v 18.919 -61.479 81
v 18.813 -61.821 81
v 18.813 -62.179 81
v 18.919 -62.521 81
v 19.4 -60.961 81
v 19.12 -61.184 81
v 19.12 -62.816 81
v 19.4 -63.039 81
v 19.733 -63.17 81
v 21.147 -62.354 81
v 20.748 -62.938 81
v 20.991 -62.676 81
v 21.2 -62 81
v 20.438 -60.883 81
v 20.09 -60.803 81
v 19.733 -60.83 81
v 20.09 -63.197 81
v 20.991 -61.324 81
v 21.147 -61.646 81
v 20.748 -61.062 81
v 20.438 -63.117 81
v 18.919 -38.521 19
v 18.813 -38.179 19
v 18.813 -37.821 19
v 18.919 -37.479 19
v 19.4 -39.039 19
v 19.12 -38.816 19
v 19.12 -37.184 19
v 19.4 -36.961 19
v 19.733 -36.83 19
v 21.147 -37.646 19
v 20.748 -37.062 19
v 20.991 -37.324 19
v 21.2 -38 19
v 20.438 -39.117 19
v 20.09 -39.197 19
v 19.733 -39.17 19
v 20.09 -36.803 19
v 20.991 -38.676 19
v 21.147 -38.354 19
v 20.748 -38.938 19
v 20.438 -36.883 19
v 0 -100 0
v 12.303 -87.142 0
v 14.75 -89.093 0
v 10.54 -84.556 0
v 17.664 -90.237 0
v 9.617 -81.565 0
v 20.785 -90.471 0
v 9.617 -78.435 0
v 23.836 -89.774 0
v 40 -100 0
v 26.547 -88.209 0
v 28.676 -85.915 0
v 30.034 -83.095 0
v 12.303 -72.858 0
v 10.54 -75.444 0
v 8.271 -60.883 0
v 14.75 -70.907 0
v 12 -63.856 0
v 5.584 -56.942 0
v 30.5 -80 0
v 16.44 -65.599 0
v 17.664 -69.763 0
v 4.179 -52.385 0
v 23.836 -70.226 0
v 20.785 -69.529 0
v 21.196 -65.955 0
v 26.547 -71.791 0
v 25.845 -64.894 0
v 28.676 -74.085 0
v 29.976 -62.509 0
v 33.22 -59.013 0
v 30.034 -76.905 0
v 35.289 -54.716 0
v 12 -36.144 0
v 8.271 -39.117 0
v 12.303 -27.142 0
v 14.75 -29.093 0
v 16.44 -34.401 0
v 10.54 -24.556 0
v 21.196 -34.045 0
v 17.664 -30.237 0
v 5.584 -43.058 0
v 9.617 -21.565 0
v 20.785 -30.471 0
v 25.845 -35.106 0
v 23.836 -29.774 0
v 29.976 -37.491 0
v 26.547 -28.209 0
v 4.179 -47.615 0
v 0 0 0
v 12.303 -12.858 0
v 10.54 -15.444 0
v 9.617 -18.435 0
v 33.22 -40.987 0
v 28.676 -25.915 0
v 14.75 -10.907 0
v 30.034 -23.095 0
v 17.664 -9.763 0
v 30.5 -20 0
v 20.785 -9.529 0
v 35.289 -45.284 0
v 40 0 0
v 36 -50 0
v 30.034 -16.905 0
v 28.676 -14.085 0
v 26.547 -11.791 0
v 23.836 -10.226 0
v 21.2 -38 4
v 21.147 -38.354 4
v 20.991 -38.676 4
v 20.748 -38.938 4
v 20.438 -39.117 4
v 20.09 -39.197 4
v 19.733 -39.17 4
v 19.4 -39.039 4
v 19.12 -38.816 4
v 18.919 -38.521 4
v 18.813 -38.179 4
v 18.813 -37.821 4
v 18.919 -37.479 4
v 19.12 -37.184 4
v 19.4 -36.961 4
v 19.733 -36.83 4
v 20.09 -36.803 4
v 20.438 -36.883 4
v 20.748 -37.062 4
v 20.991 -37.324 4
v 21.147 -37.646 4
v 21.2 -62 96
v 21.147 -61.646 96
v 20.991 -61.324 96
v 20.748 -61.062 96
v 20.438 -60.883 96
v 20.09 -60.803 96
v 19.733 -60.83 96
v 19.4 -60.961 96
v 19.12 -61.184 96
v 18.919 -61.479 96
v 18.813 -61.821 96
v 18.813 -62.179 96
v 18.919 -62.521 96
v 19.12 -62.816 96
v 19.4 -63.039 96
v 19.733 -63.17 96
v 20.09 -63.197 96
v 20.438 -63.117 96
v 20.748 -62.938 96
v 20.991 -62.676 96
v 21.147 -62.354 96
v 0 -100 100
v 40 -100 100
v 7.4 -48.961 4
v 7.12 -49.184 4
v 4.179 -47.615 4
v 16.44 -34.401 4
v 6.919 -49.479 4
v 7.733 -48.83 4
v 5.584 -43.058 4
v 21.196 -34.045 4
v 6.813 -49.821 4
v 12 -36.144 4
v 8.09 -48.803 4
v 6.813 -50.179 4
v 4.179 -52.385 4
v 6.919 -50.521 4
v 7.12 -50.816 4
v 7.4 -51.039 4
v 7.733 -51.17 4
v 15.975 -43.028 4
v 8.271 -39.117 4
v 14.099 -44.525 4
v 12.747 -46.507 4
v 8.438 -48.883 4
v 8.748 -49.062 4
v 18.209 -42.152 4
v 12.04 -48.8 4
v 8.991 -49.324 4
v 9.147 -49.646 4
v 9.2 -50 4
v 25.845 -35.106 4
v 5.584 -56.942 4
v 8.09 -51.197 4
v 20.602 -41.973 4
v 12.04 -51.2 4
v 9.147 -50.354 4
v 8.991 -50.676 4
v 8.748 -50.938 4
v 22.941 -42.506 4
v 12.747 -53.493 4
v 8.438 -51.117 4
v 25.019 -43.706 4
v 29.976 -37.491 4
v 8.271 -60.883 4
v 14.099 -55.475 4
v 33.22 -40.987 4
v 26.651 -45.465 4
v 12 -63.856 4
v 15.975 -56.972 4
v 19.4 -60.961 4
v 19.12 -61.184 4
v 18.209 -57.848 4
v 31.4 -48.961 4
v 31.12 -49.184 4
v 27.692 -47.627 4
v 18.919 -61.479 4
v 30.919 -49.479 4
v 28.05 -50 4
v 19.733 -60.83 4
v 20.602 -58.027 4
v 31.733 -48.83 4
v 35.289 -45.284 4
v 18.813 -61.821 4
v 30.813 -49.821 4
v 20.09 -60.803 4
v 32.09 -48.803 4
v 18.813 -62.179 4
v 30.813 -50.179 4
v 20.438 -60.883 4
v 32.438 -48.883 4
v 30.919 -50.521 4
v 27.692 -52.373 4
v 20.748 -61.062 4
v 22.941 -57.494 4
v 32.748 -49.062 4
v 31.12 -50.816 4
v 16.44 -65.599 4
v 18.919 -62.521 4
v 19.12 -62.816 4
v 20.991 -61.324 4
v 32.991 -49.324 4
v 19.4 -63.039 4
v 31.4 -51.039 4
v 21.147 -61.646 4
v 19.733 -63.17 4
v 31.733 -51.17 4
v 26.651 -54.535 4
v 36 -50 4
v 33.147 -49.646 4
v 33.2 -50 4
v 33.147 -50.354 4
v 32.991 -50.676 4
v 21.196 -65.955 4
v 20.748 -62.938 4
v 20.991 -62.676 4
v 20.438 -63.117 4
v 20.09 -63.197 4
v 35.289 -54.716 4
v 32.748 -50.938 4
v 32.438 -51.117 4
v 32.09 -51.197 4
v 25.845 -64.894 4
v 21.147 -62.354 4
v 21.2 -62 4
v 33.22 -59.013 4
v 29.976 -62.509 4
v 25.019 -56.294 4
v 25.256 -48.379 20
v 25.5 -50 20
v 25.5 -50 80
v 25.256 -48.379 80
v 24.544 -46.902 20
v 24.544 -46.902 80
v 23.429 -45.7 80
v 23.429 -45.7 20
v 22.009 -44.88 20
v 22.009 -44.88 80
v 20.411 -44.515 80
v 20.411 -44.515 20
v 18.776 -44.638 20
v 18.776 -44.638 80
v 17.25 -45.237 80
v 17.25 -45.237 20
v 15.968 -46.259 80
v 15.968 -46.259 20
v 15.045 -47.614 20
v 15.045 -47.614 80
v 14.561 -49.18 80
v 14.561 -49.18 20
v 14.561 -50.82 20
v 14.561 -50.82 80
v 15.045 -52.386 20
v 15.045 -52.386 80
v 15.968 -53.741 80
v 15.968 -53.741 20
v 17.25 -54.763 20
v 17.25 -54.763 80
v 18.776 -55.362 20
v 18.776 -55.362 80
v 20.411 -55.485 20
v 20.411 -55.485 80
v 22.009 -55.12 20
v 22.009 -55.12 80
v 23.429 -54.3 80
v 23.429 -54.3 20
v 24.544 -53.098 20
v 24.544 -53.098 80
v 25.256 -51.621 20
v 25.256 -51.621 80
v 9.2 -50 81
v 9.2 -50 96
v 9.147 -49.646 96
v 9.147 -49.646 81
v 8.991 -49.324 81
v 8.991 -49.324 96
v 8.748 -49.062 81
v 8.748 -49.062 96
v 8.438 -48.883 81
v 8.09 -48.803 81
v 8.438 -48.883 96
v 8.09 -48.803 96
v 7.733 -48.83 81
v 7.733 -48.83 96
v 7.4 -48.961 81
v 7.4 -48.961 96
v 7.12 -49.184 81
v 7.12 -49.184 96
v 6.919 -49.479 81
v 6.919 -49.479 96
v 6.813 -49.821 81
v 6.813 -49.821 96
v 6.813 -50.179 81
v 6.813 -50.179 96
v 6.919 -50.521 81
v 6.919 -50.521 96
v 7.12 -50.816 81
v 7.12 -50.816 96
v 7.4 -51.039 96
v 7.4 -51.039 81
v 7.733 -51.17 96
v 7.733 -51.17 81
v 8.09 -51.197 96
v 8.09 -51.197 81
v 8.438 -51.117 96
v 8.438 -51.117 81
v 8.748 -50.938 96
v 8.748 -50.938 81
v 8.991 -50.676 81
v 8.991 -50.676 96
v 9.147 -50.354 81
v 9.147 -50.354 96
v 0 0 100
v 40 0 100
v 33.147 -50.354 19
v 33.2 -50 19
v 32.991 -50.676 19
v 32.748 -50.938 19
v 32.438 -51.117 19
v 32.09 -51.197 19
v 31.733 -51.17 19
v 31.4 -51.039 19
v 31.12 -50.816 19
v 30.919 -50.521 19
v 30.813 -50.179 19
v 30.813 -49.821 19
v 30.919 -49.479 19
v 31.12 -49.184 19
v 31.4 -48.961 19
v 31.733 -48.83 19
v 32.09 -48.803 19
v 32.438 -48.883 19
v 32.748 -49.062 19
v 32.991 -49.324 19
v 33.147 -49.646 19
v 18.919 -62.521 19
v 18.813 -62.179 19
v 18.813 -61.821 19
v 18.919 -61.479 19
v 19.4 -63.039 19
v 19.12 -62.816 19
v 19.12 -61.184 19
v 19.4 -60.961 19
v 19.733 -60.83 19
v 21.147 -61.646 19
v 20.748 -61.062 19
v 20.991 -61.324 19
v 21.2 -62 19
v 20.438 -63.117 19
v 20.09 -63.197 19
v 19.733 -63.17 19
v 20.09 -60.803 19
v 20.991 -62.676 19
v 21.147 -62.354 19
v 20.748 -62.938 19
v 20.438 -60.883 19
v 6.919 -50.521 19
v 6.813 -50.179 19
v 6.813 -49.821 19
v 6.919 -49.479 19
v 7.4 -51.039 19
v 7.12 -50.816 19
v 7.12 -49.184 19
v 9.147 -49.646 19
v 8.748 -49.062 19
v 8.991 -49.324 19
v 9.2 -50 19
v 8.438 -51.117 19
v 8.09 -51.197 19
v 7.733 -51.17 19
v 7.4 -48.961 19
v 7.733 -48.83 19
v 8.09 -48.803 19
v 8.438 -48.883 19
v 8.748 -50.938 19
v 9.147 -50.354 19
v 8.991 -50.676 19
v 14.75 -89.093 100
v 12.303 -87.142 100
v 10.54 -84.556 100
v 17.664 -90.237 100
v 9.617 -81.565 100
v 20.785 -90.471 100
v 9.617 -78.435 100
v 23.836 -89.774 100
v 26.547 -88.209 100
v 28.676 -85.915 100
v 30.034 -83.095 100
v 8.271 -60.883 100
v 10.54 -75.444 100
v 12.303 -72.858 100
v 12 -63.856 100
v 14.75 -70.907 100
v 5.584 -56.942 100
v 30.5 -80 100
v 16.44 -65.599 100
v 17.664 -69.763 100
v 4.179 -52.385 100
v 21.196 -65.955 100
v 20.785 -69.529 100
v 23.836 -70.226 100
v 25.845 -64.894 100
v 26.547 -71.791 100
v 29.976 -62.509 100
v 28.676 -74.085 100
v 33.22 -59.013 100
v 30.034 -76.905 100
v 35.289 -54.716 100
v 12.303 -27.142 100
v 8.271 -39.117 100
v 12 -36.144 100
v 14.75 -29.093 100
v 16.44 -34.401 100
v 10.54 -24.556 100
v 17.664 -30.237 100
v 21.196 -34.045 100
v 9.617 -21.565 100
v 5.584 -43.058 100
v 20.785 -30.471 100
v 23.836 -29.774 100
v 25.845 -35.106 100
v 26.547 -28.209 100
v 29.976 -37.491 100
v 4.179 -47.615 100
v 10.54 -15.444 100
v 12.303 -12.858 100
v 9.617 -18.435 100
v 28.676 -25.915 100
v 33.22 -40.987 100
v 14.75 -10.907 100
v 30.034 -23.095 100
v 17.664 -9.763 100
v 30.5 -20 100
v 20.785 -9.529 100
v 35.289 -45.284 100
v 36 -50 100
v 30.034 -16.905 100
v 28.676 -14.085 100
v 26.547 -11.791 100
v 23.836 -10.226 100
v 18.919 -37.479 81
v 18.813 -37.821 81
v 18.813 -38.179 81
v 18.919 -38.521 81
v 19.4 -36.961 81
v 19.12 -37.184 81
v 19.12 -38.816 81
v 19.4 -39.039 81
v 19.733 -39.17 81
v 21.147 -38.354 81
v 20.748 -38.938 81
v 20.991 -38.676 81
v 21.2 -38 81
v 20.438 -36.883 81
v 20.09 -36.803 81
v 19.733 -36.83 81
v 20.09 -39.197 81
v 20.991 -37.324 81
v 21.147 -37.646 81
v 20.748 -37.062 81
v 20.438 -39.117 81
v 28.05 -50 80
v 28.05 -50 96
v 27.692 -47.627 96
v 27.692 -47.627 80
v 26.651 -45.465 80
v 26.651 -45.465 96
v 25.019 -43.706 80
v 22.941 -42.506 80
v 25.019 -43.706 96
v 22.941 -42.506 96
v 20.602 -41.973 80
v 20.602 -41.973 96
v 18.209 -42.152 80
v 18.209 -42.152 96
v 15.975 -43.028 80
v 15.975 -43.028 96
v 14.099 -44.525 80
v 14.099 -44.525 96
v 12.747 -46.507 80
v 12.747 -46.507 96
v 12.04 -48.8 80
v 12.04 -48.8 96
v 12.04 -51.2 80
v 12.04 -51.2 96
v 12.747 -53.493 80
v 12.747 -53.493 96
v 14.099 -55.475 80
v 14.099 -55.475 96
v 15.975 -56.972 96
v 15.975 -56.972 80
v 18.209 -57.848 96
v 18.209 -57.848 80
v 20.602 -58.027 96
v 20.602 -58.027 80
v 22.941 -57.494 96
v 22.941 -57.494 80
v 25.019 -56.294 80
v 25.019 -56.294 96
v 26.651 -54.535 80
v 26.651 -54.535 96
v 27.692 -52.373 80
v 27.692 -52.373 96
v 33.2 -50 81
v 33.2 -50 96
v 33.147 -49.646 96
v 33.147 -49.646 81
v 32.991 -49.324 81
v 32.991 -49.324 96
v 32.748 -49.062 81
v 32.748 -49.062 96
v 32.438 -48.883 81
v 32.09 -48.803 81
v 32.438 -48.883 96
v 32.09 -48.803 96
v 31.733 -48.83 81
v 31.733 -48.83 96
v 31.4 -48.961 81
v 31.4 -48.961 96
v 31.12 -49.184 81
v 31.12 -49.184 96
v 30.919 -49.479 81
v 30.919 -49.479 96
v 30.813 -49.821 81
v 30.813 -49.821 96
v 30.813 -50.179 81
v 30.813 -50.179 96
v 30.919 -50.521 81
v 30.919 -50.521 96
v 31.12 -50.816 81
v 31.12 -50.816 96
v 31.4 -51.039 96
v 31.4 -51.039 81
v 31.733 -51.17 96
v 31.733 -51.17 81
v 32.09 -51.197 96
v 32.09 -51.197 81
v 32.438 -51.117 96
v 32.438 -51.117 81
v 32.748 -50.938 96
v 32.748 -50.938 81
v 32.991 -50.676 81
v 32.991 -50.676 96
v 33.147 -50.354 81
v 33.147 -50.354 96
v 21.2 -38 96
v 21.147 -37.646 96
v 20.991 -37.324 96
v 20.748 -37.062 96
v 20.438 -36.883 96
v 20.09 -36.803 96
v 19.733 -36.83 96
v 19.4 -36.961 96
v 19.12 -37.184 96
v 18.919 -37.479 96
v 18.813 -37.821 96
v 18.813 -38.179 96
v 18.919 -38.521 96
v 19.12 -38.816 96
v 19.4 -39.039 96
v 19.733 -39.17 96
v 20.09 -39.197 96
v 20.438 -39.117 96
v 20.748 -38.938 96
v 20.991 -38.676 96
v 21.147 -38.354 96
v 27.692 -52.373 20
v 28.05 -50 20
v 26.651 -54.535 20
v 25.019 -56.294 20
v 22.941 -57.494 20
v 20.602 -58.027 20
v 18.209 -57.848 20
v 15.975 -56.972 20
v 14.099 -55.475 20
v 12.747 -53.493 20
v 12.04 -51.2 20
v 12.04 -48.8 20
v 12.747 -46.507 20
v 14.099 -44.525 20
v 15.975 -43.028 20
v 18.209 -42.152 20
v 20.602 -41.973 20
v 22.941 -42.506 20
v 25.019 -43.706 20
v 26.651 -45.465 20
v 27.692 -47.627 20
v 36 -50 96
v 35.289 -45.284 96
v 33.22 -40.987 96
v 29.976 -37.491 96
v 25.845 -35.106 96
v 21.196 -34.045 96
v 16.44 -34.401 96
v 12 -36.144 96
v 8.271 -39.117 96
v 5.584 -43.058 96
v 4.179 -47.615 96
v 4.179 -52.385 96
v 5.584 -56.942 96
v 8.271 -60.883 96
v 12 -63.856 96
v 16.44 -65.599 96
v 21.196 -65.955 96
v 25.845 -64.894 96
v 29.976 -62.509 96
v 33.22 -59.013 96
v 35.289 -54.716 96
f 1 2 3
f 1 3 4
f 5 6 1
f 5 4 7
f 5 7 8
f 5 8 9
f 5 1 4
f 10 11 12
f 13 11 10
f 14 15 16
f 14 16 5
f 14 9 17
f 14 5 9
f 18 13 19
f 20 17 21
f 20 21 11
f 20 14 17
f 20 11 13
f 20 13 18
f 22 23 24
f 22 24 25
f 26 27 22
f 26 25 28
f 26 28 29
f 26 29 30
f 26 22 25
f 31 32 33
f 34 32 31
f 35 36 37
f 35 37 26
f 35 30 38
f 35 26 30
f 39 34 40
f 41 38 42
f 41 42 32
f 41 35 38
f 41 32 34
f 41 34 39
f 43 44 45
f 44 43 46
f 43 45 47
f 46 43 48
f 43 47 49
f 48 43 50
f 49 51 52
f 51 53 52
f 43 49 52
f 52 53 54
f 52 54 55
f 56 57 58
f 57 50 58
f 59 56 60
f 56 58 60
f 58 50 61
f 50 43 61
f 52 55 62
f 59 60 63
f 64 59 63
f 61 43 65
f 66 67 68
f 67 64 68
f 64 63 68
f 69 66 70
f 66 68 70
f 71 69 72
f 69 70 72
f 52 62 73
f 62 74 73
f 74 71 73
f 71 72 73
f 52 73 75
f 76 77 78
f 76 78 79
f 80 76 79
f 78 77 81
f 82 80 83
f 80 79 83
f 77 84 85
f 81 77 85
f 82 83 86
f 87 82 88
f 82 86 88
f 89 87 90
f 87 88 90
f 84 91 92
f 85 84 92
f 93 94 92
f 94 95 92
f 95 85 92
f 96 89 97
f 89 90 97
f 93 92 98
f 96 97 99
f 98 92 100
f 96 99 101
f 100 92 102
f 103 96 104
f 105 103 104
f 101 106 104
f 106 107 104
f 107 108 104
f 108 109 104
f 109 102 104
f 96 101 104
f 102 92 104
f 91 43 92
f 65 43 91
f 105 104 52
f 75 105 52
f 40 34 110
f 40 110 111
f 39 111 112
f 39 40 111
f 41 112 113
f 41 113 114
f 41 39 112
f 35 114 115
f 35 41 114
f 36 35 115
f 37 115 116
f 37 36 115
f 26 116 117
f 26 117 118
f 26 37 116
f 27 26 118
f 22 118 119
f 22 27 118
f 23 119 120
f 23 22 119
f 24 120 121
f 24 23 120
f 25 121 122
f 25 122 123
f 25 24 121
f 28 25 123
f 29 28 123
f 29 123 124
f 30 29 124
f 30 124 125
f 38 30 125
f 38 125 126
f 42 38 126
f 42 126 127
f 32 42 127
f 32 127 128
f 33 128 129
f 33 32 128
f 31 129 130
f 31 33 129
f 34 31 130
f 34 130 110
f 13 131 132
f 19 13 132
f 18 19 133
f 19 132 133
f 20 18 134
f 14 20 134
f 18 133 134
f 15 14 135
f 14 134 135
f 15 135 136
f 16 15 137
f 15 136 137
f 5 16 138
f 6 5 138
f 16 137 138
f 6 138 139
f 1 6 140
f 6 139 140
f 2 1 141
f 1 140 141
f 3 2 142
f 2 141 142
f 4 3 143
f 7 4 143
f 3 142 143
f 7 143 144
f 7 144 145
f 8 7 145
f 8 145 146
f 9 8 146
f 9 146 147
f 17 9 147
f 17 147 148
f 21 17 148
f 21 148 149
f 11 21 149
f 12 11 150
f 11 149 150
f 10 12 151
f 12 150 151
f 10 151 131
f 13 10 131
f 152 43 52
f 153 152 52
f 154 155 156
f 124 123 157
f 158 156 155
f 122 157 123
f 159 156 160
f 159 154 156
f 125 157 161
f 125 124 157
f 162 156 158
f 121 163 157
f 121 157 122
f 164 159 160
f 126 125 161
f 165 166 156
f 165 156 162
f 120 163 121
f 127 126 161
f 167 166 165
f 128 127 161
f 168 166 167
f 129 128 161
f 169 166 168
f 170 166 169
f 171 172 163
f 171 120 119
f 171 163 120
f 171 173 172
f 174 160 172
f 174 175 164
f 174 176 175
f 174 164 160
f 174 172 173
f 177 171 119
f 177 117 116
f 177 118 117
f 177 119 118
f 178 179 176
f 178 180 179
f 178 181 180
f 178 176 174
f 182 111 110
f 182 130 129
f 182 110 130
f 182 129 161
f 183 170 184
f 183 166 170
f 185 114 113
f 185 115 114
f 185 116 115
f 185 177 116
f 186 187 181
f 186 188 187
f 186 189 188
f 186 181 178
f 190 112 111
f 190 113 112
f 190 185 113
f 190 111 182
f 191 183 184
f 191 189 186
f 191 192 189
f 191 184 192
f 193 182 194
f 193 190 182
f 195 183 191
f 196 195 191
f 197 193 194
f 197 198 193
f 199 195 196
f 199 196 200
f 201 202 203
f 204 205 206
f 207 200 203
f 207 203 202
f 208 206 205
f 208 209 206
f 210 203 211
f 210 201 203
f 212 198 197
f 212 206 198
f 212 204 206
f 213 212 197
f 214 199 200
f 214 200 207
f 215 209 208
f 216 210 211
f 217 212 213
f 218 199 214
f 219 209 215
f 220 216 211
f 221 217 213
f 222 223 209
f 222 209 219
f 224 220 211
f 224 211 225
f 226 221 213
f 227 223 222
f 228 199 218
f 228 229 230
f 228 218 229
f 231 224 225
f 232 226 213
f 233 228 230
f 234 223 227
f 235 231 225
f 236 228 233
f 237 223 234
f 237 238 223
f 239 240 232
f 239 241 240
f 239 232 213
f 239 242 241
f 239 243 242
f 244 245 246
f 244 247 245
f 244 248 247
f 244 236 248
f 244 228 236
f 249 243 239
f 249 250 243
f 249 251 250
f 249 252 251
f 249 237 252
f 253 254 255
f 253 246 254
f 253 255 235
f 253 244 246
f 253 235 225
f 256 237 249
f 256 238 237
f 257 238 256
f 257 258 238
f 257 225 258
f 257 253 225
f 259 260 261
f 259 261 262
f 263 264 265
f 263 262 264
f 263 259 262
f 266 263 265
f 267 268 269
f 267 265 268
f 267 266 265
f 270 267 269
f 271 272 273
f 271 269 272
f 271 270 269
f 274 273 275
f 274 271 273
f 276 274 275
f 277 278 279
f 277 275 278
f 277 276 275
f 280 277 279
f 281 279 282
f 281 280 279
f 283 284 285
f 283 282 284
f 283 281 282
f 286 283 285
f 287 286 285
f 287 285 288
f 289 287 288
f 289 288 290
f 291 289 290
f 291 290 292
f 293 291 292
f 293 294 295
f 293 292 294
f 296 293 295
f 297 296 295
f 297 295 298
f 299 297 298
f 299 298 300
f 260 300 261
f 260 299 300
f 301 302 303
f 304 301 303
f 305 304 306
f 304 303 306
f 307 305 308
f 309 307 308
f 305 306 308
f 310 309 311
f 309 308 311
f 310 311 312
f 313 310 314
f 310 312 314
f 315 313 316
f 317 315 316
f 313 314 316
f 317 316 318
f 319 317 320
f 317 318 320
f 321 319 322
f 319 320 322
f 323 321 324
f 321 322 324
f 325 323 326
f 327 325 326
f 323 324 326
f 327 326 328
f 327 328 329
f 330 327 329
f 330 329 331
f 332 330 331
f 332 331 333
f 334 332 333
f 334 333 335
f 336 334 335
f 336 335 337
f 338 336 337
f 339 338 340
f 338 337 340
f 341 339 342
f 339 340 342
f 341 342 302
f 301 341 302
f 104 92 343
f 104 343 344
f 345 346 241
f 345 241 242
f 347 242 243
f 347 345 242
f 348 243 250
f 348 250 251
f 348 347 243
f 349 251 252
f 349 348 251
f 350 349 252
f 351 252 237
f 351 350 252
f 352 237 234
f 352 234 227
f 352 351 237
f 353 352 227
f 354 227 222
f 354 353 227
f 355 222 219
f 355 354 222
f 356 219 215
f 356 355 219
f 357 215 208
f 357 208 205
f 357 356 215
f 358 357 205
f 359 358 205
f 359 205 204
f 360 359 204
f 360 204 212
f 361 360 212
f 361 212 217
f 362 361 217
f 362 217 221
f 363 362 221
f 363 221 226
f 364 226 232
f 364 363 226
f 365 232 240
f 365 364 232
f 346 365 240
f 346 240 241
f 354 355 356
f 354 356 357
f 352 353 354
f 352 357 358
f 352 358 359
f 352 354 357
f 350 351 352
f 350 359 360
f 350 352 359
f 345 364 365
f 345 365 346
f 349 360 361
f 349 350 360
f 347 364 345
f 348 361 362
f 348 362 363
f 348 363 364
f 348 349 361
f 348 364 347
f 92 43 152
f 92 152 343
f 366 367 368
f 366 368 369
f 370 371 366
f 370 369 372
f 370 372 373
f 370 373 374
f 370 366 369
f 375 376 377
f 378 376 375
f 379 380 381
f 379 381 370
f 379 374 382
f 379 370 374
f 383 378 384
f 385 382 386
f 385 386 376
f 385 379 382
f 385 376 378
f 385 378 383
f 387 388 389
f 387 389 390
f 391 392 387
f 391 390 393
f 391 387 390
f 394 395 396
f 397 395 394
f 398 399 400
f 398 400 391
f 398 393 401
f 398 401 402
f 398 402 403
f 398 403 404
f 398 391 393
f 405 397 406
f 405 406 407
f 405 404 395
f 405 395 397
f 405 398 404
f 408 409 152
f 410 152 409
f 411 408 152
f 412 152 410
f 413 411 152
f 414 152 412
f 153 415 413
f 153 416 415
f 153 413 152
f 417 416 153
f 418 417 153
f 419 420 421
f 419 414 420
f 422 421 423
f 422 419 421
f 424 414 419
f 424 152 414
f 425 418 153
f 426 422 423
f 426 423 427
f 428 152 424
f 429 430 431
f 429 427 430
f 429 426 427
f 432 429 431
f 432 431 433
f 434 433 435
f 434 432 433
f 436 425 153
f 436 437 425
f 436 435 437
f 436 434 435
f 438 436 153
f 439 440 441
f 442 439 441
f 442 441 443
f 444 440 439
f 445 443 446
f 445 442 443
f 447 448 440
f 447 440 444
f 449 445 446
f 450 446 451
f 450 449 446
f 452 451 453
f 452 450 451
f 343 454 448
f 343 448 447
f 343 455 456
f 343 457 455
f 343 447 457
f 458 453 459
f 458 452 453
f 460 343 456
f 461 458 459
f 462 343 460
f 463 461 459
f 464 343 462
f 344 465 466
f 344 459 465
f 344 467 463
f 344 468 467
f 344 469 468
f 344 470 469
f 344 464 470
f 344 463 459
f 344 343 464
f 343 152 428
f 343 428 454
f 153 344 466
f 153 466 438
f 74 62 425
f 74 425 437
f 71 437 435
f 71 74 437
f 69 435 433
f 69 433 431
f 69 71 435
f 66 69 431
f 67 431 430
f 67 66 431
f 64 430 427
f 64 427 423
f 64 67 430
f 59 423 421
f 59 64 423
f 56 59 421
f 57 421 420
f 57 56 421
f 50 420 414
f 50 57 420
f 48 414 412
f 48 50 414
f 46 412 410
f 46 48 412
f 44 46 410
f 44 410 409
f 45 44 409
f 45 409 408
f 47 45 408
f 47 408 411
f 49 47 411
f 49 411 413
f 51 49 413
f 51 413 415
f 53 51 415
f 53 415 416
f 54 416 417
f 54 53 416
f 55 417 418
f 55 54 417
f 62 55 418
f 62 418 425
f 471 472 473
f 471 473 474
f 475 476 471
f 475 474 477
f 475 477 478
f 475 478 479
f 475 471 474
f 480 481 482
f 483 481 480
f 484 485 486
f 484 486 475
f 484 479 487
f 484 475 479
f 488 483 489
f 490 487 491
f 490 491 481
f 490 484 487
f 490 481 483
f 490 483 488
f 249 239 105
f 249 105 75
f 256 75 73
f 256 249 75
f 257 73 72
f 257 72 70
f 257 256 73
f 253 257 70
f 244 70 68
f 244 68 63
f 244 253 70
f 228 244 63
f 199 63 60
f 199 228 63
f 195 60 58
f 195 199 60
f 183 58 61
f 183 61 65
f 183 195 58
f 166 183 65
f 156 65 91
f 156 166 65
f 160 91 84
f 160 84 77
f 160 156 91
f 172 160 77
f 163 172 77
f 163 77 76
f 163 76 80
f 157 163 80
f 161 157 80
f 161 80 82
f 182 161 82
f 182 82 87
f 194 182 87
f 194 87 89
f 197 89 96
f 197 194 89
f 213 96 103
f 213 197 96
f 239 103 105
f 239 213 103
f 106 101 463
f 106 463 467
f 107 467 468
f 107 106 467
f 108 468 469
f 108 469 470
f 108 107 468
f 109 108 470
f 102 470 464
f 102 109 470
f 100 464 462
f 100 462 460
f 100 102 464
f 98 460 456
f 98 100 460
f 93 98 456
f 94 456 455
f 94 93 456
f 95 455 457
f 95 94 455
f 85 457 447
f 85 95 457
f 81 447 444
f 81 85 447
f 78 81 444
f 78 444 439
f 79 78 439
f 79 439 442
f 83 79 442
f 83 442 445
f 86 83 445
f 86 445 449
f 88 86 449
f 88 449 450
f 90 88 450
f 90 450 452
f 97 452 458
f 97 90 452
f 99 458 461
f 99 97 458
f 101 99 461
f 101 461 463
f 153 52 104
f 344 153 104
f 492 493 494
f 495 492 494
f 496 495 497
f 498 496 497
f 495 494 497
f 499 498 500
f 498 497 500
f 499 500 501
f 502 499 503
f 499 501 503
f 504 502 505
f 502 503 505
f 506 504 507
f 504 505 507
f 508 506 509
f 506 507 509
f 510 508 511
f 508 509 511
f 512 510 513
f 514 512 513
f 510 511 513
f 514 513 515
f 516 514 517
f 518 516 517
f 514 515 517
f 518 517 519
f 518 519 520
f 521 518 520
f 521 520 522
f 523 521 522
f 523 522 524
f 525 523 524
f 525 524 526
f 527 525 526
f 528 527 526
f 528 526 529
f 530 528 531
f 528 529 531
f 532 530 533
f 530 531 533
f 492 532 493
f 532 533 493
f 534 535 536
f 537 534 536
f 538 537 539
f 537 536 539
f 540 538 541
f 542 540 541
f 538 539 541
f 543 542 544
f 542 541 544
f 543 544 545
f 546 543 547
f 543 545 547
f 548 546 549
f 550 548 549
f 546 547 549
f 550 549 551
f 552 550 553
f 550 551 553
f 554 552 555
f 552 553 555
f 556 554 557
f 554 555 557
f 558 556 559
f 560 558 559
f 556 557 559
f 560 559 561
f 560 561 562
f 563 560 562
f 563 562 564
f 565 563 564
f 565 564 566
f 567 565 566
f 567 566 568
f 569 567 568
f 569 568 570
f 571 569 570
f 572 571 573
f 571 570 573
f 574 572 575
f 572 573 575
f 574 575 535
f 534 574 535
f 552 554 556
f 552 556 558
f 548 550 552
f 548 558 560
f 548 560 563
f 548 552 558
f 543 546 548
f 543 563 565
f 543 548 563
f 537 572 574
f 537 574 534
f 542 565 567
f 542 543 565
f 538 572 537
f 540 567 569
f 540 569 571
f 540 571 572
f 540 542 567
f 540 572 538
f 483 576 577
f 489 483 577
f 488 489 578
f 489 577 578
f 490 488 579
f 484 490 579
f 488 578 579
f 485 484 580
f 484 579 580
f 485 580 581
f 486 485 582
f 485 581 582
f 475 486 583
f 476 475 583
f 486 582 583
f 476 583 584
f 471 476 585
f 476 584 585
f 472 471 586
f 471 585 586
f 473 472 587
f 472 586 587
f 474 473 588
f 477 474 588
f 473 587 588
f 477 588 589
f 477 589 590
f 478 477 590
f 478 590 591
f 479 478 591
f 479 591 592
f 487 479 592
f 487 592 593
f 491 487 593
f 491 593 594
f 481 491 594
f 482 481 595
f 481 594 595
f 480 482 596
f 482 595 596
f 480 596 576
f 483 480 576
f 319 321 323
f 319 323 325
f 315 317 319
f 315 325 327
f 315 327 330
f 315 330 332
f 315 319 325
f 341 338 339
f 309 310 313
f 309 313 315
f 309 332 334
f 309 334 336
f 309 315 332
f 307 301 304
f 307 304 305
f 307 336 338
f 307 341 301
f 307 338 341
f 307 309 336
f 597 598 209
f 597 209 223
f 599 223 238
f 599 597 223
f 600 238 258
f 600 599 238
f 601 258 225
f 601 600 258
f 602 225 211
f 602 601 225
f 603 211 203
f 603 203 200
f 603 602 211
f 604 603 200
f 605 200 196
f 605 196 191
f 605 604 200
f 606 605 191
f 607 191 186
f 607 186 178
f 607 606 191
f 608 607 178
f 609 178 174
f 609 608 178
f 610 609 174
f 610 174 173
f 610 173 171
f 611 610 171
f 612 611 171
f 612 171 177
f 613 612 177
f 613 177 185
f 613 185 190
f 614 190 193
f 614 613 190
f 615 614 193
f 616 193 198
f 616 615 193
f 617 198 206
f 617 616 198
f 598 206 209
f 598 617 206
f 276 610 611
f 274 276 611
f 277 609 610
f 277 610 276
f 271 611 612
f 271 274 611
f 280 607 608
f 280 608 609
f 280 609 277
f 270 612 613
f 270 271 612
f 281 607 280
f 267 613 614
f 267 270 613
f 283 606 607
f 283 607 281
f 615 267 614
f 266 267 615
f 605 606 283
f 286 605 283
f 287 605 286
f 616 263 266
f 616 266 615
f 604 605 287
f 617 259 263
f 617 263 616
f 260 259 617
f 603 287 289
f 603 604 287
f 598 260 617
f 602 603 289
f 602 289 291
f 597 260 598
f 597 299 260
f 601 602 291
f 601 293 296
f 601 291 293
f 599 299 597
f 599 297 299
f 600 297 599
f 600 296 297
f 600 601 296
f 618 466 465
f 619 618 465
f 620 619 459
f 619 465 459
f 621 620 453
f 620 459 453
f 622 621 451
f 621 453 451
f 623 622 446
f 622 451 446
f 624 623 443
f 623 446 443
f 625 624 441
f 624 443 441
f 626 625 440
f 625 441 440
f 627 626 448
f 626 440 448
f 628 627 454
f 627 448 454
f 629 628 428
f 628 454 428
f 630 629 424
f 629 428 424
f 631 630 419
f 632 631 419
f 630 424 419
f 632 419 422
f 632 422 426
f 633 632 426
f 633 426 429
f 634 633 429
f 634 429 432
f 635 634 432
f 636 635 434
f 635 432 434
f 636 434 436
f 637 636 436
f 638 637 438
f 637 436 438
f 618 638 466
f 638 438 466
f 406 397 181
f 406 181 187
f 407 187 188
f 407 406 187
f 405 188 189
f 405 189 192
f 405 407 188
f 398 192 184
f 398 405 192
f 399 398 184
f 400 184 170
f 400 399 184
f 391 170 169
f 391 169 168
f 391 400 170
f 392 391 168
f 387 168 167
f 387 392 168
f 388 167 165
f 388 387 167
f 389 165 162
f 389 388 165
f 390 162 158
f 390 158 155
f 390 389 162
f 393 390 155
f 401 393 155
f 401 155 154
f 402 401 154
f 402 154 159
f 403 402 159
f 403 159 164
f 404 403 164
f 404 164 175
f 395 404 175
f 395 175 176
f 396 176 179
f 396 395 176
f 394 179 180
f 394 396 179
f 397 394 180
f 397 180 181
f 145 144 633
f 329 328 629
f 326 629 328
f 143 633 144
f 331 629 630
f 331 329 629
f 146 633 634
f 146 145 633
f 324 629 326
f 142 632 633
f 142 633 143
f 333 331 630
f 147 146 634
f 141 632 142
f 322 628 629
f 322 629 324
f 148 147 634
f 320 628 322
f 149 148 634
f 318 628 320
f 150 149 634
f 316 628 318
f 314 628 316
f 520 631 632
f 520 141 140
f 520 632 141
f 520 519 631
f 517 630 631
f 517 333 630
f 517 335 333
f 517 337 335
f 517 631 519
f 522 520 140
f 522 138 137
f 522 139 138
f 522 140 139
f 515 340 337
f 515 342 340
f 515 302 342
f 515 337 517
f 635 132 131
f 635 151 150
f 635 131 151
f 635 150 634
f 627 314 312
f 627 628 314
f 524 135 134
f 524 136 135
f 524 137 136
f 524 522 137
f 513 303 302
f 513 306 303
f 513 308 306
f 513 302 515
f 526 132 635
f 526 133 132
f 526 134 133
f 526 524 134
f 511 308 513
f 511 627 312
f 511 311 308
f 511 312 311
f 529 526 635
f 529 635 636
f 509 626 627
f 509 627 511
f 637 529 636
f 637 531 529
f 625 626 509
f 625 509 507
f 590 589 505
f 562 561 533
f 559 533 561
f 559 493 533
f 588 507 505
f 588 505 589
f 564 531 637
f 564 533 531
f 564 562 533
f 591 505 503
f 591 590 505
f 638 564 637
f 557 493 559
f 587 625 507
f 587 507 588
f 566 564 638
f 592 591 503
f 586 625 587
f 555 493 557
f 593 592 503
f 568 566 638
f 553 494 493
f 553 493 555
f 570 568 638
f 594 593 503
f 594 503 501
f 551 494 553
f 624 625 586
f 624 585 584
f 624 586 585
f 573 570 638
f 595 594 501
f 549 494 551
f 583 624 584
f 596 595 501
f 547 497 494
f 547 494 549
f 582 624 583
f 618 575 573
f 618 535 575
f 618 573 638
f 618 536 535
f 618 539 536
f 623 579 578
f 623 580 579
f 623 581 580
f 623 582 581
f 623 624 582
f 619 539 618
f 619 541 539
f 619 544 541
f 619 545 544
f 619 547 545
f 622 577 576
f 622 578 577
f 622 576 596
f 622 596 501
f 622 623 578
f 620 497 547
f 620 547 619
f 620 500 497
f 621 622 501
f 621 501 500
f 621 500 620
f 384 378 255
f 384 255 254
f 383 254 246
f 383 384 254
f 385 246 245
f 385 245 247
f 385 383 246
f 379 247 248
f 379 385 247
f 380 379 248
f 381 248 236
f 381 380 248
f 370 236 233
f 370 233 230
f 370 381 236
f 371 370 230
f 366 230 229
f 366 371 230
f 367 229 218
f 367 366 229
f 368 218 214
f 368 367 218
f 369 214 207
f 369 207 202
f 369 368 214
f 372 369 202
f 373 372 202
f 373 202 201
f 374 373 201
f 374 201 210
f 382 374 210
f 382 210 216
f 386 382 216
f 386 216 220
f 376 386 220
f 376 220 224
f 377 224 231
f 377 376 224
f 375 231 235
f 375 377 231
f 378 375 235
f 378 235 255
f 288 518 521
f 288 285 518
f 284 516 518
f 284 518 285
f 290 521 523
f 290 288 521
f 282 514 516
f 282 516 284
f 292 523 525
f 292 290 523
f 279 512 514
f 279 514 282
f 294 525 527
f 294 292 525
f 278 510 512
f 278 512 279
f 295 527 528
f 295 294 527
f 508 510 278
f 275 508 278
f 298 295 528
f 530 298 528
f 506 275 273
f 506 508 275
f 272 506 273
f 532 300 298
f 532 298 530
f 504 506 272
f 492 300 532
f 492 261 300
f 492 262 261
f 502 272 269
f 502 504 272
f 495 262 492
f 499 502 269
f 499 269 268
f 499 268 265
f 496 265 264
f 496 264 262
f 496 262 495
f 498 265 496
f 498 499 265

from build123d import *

# Parameters (mm, degrees)
SKETCH2_W           = 40
SKETCH2_H           = 100
SKETCH2_R           = 5.5
SKETCH2_R_2         = 10.5
BOSS_EXTRUDE1_DEPTH = 100
SKETCH3_R           = 16
CUT_EXTRUDE1_DEPTH  = 4
SKETCH4_R           = 8.05
CUT_EXTRUDE2_DEPTH  = 16
SKETCH5_R           = 1.2
CUT_EXTRUDE3_DEPTH  = 15
CUT_EXTRUDE4_START  = -4
SKETCH6_R           = 16
CUT_EXTRUDE4_DEPTH  = 4
CUT_EXTRUDE5_START  = -16
SKETCH7_R           = 8.05
CUT_EXTRUDE5_DEPTH  = 16
CUT_EXTRUDE6_START  = -15
SKETCH8_R           = 1.2
CUT_EXTRUDE6_DEPTH  = 15


with BuildPart() as part:
    # Sketch2 → Boss-Extrude1 (new body)
    with BuildSketch(Plane.XY):
        with Locations((20, -50)):
            Rectangle(SKETCH2_W, SKETCH2_H)
        with Locations((20, -50)):
            Circle(SKETCH2_R, mode=Mode.SUBTRACT)
        with Locations((20, -20)):
            Circle(SKETCH2_R_2, mode=Mode.SUBTRACT)
        with Locations((20, -80)):
            Circle(SKETCH2_R_2, mode=Mode.SUBTRACT)
    extrude(amount=BOSS_EXTRUDE1_DEPTH)

    # Sketch3 → Cut-Extrude1 (cut)
    with BuildSketch(Plane.XY.offset(100)):
        with Locations((20, -50)):
            Circle(SKETCH3_R)
    extrude(amount=-CUT_EXTRUDE1_DEPTH, mode=Mode.SUBTRACT)

    # Sketch4 → Cut-Extrude2 (cut)
    with BuildSketch(Plane.XY.offset(96)):
        with Locations((20, -50)):
            Circle(SKETCH4_R)
    extrude(amount=-CUT_EXTRUDE2_DEPTH, mode=Mode.SUBTRACT)

    # Sketch5 → Cut-Extrude3 (cut)
    with BuildSketch(Plane.XY.offset(96)):
        with Locations((20, -38)):
            Circle(SKETCH5_R)
        with Locations((8, -50)):
            Circle(SKETCH5_R)
        with Locations((32, -50)):
            Circle(SKETCH5_R)
        with Locations((20, -62)):
            Circle(SKETCH5_R)
    extrude(amount=-CUT_EXTRUDE3_DEPTH, mode=Mode.SUBTRACT)

    # Sketch6 → Cut-Extrude4 (cut)
    with BuildSketch(Plane(origin=(0, 0, 0), x_dir=(-1, 0, 0), z_dir=(0, 0, -1)).offset(CUT_EXTRUDE4_START)):
        with Locations(Location((-20, -50, 0), (0, 0, 180))):
            Circle(SKETCH6_R)
    extrude(amount=CUT_EXTRUDE4_DEPTH, mode=Mode.SUBTRACT)

    # Sketch7 → Cut-Extrude5 (cut)
    with BuildSketch(Plane(origin=(0, 0, 4), x_dir=(-1, 0, 0), z_dir=(0, 0, -1)).offset(CUT_EXTRUDE5_START)):
        with Locations(Location((-20, -50, 0), (0, 0, 180))):
            Circle(SKETCH7_R)
    extrude(amount=CUT_EXTRUDE5_DEPTH, mode=Mode.SUBTRACT)

    # Sketch8 → Cut-Extrude6 (cut)
    with BuildSketch(Plane(origin=(0, 0, 4), x_dir=(-1, 0, 0), z_dir=(0, 0, -1)).offset(CUT_EXTRUDE6_START)):
        with Locations(Location((-20, -62, 0), (0, 0, 180))):
            Circle(SKETCH8_R)
        with Locations(Location((-32, -50, 0), (0, 0, 180))):
            Circle(SKETCH8_R)
        with Locations(Location((-8, -50, 0), (0, 0, 180))):
            Circle(SKETCH8_R)
        with Locations(Location((-20, -38, 0), (0, 0, 180))):
            Circle(SKETCH8_R)
    extrude(amount=CUT_EXTRUDE6_DEPTH, mode=Mode.SUBTRACT)


solid = part.part
